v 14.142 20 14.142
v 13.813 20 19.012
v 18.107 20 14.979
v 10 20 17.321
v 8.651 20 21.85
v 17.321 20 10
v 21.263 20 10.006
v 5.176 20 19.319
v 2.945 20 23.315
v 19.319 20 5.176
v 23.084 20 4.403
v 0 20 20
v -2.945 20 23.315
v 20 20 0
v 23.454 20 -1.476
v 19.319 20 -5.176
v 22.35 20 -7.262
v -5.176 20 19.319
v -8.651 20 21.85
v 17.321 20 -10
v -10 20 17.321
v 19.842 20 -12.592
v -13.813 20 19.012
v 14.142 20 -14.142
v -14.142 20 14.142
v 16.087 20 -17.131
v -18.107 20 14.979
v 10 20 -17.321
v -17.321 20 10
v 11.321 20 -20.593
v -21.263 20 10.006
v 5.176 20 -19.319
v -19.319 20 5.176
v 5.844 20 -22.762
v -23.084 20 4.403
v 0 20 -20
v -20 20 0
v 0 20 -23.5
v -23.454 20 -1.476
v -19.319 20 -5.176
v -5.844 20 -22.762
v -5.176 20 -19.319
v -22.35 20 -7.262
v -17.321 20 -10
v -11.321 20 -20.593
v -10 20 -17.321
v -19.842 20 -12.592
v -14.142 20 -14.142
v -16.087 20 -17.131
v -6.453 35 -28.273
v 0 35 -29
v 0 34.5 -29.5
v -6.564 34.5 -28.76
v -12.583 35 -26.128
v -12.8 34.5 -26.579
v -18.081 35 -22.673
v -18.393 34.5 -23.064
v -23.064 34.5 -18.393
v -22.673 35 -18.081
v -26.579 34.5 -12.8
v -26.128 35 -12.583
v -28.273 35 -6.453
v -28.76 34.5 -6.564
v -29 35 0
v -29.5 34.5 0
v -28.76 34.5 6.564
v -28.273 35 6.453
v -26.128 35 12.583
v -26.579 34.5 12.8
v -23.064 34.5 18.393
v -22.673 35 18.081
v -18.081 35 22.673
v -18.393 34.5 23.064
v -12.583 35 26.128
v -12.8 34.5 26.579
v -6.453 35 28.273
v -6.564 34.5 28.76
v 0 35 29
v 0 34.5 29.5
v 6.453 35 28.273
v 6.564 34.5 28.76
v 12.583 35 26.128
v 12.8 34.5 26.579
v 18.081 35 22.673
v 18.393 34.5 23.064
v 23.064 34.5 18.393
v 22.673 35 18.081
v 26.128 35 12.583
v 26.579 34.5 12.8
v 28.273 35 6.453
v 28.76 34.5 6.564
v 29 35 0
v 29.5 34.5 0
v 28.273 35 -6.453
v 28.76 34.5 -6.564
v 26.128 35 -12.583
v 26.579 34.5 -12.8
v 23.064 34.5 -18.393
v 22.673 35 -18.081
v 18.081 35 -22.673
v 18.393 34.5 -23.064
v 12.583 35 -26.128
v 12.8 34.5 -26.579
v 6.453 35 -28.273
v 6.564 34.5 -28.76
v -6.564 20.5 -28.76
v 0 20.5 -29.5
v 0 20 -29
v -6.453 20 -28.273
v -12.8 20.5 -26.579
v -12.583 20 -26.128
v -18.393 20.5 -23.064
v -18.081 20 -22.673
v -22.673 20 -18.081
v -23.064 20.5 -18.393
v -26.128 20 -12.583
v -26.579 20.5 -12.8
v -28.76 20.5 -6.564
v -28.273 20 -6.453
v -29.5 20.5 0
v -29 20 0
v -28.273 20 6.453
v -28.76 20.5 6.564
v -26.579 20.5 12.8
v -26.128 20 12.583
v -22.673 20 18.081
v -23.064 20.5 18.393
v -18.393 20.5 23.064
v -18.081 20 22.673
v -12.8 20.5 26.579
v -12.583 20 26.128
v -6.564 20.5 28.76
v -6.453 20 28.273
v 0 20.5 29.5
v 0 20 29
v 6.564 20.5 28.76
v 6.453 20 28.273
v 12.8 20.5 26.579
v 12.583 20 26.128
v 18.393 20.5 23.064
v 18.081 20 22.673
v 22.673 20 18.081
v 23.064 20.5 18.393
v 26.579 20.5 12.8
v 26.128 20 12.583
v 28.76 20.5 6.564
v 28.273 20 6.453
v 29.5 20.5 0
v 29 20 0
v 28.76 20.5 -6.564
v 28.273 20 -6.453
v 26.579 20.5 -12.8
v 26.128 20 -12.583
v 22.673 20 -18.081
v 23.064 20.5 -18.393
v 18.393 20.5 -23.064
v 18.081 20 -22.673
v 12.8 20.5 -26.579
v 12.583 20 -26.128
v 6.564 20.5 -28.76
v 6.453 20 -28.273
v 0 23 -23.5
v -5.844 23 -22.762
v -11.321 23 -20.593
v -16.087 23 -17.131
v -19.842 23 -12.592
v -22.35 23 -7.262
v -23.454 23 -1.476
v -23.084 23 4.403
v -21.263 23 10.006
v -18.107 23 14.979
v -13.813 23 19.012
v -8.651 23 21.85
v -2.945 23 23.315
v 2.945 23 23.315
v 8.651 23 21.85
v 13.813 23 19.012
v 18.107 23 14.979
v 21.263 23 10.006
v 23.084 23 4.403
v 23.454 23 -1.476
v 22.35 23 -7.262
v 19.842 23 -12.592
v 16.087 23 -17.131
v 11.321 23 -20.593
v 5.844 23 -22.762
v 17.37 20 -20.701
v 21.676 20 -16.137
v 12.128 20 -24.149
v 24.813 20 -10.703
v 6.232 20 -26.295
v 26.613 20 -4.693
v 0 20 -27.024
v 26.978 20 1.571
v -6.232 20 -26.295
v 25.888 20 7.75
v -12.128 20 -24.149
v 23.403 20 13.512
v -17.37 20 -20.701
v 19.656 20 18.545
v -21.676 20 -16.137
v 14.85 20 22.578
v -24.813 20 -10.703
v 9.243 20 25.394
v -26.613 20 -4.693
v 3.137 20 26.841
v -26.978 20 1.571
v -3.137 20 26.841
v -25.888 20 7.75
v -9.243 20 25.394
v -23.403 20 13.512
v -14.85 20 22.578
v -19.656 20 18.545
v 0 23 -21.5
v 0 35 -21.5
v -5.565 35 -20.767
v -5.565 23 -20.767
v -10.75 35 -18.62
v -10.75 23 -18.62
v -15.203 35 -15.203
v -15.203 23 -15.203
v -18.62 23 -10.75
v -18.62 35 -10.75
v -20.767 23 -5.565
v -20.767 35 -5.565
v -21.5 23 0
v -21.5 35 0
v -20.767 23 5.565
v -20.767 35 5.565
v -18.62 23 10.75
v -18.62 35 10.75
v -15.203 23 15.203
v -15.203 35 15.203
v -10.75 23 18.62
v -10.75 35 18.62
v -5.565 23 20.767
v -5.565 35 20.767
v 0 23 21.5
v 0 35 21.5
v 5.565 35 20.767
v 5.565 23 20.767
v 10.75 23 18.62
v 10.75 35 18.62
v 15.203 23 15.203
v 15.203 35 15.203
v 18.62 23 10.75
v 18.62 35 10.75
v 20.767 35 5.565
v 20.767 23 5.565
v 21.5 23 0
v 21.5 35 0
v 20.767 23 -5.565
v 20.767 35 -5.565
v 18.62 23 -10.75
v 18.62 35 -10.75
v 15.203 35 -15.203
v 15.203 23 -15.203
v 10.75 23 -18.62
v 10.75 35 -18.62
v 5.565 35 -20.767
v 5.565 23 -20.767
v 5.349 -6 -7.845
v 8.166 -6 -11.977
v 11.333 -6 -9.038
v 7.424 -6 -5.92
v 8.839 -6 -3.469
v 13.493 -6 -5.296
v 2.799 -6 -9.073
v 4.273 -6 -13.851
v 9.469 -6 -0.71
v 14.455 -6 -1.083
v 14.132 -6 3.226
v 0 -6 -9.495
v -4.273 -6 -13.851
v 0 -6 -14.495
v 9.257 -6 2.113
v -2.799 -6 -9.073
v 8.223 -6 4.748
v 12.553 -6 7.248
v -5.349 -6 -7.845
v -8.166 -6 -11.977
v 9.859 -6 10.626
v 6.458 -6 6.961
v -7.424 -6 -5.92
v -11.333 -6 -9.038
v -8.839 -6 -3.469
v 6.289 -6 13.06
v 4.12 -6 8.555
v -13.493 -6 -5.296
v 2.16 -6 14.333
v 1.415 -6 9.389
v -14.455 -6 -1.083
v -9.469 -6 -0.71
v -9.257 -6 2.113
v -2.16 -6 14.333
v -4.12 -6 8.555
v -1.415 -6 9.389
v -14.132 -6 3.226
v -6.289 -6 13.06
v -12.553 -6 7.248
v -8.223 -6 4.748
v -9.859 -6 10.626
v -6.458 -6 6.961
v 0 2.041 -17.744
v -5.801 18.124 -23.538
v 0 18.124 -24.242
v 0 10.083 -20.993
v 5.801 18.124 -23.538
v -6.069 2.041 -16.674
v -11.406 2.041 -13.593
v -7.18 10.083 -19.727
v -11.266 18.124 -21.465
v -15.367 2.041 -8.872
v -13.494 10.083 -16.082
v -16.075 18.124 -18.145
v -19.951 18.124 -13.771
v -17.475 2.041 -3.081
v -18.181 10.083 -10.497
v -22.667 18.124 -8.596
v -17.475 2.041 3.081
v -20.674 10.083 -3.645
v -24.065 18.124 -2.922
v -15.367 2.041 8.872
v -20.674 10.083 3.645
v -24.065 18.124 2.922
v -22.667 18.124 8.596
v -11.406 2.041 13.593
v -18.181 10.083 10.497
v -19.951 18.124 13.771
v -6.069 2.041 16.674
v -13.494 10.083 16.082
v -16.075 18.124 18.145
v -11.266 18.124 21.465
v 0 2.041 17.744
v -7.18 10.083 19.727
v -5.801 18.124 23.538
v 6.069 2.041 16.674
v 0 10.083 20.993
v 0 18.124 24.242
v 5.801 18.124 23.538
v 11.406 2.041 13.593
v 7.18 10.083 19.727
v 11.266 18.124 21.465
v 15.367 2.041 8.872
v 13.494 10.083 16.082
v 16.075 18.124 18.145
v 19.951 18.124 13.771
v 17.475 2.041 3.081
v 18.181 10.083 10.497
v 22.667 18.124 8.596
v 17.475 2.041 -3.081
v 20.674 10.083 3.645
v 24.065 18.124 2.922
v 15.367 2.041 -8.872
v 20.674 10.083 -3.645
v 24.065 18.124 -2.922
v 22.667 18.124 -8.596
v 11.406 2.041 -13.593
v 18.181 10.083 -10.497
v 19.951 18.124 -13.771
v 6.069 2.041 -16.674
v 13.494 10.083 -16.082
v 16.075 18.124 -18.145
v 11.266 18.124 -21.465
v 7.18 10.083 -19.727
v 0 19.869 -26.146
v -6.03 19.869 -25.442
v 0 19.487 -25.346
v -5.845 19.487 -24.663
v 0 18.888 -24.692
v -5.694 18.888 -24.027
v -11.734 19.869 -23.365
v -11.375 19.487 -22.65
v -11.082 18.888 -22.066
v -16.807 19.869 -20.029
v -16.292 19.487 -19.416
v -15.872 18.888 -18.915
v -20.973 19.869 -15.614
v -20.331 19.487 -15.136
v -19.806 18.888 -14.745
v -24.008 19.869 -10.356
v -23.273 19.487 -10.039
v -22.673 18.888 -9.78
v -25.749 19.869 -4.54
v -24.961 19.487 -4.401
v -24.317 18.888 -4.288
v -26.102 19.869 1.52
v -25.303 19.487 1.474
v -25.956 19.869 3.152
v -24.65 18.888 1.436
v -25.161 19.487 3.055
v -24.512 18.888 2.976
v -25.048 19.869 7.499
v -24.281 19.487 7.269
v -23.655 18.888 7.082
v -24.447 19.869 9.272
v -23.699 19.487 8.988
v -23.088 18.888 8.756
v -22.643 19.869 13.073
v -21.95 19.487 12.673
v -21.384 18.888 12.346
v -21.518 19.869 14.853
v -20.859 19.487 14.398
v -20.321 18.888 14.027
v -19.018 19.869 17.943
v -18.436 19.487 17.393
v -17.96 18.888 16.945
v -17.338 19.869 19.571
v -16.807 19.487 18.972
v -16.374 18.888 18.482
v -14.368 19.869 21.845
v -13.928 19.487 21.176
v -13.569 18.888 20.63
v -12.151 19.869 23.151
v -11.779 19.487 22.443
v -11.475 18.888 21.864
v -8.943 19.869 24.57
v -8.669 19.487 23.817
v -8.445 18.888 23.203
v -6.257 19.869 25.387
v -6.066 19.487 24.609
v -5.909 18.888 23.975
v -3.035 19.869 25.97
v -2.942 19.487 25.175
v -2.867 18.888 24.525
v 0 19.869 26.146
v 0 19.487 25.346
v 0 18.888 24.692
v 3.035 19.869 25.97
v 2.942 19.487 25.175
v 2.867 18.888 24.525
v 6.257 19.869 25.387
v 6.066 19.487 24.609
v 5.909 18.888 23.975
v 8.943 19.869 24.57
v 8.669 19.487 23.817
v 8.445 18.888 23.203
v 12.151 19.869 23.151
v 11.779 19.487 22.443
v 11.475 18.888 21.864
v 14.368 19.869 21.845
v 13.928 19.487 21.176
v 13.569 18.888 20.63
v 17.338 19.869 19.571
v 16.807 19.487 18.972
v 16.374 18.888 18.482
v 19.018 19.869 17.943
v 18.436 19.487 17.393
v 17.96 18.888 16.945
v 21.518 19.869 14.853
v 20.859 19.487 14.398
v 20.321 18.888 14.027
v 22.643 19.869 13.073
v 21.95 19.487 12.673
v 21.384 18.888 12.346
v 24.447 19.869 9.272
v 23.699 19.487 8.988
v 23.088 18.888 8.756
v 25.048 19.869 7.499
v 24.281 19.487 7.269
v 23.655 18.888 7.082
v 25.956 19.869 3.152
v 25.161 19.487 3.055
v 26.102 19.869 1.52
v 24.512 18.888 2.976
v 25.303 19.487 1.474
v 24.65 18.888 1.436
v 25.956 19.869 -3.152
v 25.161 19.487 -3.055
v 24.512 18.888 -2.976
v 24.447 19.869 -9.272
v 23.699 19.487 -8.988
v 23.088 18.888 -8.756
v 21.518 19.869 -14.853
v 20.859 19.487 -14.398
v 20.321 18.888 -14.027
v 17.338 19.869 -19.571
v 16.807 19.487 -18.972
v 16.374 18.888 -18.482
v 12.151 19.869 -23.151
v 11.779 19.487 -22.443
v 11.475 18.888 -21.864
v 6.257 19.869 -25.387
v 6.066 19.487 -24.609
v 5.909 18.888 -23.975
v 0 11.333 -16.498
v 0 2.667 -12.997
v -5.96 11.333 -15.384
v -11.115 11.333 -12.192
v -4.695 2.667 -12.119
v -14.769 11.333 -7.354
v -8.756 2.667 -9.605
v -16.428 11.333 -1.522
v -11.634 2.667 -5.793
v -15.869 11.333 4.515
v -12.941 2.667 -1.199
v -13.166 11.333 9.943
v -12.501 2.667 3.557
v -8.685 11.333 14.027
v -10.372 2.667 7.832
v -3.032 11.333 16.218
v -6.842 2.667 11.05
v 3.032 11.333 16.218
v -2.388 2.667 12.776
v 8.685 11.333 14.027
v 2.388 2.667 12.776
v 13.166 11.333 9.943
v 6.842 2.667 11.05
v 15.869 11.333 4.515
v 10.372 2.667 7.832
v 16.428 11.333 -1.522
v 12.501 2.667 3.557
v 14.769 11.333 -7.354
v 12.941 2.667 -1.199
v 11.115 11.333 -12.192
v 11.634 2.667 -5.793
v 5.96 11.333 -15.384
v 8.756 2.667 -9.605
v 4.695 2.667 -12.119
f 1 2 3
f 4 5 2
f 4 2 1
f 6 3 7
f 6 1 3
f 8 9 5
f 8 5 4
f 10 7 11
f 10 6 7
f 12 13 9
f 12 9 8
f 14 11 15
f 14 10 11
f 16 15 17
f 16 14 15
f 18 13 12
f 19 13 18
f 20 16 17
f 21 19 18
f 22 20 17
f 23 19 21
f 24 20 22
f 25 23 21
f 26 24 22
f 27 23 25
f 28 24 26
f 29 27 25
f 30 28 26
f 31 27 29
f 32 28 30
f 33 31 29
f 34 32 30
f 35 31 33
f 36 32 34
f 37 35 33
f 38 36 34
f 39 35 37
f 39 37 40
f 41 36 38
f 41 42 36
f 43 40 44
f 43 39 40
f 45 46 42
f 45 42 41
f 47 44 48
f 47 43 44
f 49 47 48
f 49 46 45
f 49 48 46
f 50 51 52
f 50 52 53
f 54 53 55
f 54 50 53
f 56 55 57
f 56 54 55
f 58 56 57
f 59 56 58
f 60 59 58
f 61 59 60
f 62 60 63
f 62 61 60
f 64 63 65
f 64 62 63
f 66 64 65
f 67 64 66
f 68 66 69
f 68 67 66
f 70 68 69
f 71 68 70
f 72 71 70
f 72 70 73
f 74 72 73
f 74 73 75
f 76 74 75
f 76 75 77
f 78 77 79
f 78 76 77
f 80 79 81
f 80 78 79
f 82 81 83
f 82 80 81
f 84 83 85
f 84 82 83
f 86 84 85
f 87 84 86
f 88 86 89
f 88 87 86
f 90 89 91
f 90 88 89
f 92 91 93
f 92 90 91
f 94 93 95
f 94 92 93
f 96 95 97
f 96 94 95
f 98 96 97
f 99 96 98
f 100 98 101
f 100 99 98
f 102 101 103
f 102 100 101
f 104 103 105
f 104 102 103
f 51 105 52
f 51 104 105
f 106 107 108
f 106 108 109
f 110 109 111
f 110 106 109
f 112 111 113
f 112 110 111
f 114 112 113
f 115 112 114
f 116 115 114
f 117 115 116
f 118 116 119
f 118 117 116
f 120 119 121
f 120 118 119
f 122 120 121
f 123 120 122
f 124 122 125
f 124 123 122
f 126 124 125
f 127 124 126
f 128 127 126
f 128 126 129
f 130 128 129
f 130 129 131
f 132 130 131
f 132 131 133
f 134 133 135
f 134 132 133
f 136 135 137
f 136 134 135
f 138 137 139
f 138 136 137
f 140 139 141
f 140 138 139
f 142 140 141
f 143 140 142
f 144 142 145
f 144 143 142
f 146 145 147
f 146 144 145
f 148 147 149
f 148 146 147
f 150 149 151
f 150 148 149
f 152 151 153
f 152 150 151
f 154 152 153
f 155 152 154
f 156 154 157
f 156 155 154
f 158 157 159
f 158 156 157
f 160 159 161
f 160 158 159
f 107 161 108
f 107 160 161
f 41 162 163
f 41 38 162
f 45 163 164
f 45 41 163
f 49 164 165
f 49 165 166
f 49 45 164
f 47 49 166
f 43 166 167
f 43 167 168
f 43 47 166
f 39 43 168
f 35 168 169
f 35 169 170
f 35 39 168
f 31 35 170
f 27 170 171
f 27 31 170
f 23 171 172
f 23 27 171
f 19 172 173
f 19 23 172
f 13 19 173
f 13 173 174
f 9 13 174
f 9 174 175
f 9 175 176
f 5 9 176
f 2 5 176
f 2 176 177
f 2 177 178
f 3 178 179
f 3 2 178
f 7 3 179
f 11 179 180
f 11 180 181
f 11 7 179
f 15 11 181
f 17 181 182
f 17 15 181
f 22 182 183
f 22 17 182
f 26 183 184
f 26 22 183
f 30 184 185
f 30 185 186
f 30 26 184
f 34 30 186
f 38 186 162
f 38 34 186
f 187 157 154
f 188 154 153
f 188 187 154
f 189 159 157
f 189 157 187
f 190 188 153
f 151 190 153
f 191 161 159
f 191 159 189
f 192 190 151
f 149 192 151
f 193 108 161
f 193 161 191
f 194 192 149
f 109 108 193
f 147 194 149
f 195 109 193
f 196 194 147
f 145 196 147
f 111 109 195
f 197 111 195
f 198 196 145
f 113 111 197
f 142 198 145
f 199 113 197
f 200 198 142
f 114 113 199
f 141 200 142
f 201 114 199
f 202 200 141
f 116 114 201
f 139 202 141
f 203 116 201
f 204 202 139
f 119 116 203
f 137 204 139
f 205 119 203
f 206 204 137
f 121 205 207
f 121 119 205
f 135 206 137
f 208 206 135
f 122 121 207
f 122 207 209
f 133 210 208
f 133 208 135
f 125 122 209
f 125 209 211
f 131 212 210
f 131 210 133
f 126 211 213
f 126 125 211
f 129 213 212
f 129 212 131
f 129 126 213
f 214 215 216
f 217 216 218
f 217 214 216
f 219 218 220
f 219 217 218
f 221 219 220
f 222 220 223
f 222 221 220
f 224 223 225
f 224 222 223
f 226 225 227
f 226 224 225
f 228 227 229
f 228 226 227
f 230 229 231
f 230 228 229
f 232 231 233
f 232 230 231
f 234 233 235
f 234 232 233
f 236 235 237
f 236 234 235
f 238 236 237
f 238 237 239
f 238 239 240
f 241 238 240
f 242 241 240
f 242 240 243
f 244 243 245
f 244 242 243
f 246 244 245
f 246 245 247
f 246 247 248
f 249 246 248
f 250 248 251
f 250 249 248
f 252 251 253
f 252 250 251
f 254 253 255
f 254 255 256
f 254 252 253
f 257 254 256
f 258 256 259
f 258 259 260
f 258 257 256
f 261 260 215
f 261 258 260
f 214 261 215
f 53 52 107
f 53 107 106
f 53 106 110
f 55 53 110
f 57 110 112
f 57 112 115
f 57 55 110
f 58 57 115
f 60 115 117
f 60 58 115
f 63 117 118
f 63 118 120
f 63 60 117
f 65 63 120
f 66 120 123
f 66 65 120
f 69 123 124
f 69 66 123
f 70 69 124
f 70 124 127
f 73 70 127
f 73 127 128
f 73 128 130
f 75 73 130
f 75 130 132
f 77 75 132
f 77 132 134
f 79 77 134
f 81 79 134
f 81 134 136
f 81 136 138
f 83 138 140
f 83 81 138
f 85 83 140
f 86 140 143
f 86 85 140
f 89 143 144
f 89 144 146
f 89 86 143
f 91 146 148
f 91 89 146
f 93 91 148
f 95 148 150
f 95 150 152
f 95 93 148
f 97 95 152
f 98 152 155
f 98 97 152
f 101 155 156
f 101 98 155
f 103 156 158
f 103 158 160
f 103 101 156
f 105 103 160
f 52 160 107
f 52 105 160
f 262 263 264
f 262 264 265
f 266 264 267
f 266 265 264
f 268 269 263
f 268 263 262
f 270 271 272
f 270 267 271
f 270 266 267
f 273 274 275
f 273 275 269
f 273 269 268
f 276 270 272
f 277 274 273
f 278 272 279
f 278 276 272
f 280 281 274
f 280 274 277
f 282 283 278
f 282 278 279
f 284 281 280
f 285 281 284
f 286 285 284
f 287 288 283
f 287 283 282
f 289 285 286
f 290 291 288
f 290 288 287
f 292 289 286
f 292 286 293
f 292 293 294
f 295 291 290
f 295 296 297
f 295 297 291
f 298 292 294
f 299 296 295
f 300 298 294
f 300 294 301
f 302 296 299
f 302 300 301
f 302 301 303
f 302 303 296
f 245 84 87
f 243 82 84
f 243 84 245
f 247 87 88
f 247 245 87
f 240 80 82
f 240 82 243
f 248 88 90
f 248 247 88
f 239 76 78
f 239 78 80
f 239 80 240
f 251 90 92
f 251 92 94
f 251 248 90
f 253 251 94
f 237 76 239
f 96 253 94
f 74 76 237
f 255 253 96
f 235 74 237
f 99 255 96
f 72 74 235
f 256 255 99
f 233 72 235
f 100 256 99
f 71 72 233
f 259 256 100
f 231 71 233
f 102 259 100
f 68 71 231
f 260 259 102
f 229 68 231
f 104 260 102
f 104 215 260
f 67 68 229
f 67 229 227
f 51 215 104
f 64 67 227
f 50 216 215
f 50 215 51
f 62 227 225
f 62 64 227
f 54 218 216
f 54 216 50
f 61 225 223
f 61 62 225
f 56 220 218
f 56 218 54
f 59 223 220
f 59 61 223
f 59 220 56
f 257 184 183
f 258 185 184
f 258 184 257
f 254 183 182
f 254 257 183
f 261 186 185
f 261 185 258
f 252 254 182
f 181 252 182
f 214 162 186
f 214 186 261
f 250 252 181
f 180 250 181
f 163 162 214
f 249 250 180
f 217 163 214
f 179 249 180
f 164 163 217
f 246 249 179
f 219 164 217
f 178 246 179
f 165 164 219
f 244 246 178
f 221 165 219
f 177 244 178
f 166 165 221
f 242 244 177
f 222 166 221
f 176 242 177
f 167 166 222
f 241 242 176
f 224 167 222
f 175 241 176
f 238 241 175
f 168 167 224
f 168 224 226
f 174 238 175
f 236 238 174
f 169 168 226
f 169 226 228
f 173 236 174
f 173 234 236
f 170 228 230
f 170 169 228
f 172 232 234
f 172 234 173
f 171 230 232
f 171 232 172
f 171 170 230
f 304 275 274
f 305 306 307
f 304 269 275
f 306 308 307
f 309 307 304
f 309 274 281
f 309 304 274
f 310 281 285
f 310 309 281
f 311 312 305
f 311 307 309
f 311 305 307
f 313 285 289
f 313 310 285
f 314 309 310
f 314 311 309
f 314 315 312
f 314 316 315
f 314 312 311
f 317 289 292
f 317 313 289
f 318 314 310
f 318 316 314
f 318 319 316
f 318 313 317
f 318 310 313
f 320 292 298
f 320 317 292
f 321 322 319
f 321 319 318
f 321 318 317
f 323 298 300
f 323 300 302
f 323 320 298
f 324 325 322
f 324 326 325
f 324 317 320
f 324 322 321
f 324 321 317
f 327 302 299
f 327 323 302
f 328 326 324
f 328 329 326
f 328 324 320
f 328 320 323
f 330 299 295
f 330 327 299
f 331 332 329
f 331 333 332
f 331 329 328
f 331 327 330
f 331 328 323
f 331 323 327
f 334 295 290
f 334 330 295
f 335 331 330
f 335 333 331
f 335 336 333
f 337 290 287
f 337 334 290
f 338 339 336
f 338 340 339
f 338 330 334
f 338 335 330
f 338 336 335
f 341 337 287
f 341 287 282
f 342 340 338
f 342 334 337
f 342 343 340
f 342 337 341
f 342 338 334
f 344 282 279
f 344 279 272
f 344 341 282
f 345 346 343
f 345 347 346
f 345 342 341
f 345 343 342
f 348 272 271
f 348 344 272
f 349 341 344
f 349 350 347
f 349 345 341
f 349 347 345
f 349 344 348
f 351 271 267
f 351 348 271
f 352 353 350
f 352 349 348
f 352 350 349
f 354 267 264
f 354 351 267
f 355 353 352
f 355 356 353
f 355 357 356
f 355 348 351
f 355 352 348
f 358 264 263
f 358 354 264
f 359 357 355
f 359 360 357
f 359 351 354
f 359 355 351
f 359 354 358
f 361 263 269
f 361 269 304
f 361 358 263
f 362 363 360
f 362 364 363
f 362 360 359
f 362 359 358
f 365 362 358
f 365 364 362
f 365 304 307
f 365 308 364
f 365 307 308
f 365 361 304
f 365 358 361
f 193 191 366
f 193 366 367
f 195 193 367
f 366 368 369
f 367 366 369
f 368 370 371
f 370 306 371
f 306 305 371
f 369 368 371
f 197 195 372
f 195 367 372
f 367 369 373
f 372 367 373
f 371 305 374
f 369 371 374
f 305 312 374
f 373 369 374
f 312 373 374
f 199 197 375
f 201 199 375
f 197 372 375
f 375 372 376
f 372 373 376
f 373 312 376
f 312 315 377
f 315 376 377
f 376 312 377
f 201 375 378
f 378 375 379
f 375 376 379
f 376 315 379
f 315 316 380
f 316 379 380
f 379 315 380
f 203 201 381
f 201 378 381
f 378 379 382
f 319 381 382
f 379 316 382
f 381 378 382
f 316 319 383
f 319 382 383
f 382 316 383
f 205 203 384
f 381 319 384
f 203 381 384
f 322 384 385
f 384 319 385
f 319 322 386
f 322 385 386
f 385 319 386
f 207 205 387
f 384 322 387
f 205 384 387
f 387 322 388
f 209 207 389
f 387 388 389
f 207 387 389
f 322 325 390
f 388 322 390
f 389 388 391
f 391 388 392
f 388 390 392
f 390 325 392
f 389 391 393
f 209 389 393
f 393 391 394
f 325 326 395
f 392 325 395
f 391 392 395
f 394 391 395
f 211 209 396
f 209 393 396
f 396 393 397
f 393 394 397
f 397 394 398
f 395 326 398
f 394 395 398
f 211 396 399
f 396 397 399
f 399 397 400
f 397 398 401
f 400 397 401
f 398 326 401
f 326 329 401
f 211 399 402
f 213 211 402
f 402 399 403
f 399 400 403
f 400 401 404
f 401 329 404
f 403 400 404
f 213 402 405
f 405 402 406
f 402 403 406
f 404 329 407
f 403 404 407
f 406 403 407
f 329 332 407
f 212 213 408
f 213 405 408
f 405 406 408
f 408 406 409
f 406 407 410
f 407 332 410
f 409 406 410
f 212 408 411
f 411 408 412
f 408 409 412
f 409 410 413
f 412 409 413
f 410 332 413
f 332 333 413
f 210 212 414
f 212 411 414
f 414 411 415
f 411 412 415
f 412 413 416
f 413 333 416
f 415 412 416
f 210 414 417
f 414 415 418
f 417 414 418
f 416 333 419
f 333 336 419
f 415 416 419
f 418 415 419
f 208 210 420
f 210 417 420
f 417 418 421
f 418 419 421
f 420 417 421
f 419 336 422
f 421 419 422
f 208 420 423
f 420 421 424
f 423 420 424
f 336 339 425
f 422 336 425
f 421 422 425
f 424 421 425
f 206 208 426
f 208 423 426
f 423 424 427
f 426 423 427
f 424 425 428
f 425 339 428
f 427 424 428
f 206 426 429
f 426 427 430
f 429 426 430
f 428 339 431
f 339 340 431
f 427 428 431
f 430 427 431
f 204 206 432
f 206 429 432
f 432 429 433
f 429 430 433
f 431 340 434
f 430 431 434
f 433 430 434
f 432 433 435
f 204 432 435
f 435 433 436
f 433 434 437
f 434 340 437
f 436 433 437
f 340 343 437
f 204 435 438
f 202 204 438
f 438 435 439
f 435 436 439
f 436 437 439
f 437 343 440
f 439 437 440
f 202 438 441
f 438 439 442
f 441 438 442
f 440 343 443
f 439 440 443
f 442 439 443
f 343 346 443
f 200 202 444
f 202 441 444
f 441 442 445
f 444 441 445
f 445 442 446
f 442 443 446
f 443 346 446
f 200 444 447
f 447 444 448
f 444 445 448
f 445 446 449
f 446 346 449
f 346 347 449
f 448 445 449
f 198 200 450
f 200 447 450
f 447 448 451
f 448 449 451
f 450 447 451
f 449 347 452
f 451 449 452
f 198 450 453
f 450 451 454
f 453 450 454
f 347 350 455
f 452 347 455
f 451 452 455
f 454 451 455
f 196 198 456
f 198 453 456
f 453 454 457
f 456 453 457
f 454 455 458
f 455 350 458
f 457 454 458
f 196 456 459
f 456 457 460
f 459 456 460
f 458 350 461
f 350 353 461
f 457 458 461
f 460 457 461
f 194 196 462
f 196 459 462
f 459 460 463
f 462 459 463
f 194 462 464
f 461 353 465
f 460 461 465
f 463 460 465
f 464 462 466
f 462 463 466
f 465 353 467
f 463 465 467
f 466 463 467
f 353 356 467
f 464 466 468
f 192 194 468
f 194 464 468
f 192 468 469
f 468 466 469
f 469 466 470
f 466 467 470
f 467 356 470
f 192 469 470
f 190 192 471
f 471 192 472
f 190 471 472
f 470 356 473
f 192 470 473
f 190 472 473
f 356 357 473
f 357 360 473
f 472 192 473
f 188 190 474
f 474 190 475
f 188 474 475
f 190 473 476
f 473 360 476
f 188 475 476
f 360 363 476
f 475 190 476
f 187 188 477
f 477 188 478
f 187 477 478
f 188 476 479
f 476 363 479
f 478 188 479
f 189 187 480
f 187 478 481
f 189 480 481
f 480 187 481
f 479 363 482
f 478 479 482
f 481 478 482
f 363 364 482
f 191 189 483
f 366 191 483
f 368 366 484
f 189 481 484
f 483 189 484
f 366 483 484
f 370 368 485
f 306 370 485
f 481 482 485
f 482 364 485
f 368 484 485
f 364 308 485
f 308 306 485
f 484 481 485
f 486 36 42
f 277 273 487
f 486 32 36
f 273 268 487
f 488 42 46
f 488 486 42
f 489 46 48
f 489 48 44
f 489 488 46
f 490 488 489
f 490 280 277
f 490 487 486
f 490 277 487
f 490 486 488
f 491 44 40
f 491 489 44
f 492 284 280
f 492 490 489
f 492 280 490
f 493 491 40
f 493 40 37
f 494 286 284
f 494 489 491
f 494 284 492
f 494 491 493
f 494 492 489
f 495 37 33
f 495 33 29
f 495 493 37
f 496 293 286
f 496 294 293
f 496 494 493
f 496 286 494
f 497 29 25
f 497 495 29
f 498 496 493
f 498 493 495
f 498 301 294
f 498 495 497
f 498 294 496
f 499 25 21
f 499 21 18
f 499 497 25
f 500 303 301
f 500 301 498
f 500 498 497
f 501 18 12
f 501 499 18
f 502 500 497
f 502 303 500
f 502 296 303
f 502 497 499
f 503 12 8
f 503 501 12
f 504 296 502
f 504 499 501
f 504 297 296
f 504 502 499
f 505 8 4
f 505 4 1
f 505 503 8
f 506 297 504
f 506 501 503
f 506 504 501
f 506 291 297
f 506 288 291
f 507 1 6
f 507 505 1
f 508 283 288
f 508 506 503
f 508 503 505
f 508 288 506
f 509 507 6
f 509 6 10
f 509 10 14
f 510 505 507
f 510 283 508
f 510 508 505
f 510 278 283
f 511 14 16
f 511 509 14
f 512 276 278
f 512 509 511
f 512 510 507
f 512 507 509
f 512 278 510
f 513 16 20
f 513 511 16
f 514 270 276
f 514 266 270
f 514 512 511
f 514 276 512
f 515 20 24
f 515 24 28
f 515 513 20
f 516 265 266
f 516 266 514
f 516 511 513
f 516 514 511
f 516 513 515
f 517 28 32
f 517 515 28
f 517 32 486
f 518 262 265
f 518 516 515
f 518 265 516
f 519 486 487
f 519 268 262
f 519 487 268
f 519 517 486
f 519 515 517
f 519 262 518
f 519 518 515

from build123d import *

# Parameters (mm, degrees)
CHANFRO1_SIZE = 0.5
FILETE1_R     = 3


with BuildPart() as part:
    # Esboço1 → Revolução1 (revolve)
    with BuildSketch(Plane(origin=(0, 0, 0), x_dir=(0, 0, -1), z_dir=(1, 0, 0))):
        Polygon((23.5, 20), (20, 20), (9.495318128, -6), (14.495318128, -6), (25, 20), (29.5, 20), (29.5, 35), (21.5, 35), (21.5, 23), (23.5, 23), align=None)
    revolve(axis=Axis((0, 0, 0), (0, 1, 0)))

    # Chanfro1
    chanfro1_edges = [part.edges().sort_by_distance(p)[0] for p in [
        (0, 35, 29.5),
        (0, 20, 29.5),
    ]]
    chamfer(chanfro1_edges, length=CHANFRO1_SIZE)

    # Filete1
    filete1_edges = [part.edges().sort_by_distance(p)[0] for p in [
        (0, 20, 25),
    ]]
    fillet(filete1_edges, radius=FILETE1_R)


solid = part.part
